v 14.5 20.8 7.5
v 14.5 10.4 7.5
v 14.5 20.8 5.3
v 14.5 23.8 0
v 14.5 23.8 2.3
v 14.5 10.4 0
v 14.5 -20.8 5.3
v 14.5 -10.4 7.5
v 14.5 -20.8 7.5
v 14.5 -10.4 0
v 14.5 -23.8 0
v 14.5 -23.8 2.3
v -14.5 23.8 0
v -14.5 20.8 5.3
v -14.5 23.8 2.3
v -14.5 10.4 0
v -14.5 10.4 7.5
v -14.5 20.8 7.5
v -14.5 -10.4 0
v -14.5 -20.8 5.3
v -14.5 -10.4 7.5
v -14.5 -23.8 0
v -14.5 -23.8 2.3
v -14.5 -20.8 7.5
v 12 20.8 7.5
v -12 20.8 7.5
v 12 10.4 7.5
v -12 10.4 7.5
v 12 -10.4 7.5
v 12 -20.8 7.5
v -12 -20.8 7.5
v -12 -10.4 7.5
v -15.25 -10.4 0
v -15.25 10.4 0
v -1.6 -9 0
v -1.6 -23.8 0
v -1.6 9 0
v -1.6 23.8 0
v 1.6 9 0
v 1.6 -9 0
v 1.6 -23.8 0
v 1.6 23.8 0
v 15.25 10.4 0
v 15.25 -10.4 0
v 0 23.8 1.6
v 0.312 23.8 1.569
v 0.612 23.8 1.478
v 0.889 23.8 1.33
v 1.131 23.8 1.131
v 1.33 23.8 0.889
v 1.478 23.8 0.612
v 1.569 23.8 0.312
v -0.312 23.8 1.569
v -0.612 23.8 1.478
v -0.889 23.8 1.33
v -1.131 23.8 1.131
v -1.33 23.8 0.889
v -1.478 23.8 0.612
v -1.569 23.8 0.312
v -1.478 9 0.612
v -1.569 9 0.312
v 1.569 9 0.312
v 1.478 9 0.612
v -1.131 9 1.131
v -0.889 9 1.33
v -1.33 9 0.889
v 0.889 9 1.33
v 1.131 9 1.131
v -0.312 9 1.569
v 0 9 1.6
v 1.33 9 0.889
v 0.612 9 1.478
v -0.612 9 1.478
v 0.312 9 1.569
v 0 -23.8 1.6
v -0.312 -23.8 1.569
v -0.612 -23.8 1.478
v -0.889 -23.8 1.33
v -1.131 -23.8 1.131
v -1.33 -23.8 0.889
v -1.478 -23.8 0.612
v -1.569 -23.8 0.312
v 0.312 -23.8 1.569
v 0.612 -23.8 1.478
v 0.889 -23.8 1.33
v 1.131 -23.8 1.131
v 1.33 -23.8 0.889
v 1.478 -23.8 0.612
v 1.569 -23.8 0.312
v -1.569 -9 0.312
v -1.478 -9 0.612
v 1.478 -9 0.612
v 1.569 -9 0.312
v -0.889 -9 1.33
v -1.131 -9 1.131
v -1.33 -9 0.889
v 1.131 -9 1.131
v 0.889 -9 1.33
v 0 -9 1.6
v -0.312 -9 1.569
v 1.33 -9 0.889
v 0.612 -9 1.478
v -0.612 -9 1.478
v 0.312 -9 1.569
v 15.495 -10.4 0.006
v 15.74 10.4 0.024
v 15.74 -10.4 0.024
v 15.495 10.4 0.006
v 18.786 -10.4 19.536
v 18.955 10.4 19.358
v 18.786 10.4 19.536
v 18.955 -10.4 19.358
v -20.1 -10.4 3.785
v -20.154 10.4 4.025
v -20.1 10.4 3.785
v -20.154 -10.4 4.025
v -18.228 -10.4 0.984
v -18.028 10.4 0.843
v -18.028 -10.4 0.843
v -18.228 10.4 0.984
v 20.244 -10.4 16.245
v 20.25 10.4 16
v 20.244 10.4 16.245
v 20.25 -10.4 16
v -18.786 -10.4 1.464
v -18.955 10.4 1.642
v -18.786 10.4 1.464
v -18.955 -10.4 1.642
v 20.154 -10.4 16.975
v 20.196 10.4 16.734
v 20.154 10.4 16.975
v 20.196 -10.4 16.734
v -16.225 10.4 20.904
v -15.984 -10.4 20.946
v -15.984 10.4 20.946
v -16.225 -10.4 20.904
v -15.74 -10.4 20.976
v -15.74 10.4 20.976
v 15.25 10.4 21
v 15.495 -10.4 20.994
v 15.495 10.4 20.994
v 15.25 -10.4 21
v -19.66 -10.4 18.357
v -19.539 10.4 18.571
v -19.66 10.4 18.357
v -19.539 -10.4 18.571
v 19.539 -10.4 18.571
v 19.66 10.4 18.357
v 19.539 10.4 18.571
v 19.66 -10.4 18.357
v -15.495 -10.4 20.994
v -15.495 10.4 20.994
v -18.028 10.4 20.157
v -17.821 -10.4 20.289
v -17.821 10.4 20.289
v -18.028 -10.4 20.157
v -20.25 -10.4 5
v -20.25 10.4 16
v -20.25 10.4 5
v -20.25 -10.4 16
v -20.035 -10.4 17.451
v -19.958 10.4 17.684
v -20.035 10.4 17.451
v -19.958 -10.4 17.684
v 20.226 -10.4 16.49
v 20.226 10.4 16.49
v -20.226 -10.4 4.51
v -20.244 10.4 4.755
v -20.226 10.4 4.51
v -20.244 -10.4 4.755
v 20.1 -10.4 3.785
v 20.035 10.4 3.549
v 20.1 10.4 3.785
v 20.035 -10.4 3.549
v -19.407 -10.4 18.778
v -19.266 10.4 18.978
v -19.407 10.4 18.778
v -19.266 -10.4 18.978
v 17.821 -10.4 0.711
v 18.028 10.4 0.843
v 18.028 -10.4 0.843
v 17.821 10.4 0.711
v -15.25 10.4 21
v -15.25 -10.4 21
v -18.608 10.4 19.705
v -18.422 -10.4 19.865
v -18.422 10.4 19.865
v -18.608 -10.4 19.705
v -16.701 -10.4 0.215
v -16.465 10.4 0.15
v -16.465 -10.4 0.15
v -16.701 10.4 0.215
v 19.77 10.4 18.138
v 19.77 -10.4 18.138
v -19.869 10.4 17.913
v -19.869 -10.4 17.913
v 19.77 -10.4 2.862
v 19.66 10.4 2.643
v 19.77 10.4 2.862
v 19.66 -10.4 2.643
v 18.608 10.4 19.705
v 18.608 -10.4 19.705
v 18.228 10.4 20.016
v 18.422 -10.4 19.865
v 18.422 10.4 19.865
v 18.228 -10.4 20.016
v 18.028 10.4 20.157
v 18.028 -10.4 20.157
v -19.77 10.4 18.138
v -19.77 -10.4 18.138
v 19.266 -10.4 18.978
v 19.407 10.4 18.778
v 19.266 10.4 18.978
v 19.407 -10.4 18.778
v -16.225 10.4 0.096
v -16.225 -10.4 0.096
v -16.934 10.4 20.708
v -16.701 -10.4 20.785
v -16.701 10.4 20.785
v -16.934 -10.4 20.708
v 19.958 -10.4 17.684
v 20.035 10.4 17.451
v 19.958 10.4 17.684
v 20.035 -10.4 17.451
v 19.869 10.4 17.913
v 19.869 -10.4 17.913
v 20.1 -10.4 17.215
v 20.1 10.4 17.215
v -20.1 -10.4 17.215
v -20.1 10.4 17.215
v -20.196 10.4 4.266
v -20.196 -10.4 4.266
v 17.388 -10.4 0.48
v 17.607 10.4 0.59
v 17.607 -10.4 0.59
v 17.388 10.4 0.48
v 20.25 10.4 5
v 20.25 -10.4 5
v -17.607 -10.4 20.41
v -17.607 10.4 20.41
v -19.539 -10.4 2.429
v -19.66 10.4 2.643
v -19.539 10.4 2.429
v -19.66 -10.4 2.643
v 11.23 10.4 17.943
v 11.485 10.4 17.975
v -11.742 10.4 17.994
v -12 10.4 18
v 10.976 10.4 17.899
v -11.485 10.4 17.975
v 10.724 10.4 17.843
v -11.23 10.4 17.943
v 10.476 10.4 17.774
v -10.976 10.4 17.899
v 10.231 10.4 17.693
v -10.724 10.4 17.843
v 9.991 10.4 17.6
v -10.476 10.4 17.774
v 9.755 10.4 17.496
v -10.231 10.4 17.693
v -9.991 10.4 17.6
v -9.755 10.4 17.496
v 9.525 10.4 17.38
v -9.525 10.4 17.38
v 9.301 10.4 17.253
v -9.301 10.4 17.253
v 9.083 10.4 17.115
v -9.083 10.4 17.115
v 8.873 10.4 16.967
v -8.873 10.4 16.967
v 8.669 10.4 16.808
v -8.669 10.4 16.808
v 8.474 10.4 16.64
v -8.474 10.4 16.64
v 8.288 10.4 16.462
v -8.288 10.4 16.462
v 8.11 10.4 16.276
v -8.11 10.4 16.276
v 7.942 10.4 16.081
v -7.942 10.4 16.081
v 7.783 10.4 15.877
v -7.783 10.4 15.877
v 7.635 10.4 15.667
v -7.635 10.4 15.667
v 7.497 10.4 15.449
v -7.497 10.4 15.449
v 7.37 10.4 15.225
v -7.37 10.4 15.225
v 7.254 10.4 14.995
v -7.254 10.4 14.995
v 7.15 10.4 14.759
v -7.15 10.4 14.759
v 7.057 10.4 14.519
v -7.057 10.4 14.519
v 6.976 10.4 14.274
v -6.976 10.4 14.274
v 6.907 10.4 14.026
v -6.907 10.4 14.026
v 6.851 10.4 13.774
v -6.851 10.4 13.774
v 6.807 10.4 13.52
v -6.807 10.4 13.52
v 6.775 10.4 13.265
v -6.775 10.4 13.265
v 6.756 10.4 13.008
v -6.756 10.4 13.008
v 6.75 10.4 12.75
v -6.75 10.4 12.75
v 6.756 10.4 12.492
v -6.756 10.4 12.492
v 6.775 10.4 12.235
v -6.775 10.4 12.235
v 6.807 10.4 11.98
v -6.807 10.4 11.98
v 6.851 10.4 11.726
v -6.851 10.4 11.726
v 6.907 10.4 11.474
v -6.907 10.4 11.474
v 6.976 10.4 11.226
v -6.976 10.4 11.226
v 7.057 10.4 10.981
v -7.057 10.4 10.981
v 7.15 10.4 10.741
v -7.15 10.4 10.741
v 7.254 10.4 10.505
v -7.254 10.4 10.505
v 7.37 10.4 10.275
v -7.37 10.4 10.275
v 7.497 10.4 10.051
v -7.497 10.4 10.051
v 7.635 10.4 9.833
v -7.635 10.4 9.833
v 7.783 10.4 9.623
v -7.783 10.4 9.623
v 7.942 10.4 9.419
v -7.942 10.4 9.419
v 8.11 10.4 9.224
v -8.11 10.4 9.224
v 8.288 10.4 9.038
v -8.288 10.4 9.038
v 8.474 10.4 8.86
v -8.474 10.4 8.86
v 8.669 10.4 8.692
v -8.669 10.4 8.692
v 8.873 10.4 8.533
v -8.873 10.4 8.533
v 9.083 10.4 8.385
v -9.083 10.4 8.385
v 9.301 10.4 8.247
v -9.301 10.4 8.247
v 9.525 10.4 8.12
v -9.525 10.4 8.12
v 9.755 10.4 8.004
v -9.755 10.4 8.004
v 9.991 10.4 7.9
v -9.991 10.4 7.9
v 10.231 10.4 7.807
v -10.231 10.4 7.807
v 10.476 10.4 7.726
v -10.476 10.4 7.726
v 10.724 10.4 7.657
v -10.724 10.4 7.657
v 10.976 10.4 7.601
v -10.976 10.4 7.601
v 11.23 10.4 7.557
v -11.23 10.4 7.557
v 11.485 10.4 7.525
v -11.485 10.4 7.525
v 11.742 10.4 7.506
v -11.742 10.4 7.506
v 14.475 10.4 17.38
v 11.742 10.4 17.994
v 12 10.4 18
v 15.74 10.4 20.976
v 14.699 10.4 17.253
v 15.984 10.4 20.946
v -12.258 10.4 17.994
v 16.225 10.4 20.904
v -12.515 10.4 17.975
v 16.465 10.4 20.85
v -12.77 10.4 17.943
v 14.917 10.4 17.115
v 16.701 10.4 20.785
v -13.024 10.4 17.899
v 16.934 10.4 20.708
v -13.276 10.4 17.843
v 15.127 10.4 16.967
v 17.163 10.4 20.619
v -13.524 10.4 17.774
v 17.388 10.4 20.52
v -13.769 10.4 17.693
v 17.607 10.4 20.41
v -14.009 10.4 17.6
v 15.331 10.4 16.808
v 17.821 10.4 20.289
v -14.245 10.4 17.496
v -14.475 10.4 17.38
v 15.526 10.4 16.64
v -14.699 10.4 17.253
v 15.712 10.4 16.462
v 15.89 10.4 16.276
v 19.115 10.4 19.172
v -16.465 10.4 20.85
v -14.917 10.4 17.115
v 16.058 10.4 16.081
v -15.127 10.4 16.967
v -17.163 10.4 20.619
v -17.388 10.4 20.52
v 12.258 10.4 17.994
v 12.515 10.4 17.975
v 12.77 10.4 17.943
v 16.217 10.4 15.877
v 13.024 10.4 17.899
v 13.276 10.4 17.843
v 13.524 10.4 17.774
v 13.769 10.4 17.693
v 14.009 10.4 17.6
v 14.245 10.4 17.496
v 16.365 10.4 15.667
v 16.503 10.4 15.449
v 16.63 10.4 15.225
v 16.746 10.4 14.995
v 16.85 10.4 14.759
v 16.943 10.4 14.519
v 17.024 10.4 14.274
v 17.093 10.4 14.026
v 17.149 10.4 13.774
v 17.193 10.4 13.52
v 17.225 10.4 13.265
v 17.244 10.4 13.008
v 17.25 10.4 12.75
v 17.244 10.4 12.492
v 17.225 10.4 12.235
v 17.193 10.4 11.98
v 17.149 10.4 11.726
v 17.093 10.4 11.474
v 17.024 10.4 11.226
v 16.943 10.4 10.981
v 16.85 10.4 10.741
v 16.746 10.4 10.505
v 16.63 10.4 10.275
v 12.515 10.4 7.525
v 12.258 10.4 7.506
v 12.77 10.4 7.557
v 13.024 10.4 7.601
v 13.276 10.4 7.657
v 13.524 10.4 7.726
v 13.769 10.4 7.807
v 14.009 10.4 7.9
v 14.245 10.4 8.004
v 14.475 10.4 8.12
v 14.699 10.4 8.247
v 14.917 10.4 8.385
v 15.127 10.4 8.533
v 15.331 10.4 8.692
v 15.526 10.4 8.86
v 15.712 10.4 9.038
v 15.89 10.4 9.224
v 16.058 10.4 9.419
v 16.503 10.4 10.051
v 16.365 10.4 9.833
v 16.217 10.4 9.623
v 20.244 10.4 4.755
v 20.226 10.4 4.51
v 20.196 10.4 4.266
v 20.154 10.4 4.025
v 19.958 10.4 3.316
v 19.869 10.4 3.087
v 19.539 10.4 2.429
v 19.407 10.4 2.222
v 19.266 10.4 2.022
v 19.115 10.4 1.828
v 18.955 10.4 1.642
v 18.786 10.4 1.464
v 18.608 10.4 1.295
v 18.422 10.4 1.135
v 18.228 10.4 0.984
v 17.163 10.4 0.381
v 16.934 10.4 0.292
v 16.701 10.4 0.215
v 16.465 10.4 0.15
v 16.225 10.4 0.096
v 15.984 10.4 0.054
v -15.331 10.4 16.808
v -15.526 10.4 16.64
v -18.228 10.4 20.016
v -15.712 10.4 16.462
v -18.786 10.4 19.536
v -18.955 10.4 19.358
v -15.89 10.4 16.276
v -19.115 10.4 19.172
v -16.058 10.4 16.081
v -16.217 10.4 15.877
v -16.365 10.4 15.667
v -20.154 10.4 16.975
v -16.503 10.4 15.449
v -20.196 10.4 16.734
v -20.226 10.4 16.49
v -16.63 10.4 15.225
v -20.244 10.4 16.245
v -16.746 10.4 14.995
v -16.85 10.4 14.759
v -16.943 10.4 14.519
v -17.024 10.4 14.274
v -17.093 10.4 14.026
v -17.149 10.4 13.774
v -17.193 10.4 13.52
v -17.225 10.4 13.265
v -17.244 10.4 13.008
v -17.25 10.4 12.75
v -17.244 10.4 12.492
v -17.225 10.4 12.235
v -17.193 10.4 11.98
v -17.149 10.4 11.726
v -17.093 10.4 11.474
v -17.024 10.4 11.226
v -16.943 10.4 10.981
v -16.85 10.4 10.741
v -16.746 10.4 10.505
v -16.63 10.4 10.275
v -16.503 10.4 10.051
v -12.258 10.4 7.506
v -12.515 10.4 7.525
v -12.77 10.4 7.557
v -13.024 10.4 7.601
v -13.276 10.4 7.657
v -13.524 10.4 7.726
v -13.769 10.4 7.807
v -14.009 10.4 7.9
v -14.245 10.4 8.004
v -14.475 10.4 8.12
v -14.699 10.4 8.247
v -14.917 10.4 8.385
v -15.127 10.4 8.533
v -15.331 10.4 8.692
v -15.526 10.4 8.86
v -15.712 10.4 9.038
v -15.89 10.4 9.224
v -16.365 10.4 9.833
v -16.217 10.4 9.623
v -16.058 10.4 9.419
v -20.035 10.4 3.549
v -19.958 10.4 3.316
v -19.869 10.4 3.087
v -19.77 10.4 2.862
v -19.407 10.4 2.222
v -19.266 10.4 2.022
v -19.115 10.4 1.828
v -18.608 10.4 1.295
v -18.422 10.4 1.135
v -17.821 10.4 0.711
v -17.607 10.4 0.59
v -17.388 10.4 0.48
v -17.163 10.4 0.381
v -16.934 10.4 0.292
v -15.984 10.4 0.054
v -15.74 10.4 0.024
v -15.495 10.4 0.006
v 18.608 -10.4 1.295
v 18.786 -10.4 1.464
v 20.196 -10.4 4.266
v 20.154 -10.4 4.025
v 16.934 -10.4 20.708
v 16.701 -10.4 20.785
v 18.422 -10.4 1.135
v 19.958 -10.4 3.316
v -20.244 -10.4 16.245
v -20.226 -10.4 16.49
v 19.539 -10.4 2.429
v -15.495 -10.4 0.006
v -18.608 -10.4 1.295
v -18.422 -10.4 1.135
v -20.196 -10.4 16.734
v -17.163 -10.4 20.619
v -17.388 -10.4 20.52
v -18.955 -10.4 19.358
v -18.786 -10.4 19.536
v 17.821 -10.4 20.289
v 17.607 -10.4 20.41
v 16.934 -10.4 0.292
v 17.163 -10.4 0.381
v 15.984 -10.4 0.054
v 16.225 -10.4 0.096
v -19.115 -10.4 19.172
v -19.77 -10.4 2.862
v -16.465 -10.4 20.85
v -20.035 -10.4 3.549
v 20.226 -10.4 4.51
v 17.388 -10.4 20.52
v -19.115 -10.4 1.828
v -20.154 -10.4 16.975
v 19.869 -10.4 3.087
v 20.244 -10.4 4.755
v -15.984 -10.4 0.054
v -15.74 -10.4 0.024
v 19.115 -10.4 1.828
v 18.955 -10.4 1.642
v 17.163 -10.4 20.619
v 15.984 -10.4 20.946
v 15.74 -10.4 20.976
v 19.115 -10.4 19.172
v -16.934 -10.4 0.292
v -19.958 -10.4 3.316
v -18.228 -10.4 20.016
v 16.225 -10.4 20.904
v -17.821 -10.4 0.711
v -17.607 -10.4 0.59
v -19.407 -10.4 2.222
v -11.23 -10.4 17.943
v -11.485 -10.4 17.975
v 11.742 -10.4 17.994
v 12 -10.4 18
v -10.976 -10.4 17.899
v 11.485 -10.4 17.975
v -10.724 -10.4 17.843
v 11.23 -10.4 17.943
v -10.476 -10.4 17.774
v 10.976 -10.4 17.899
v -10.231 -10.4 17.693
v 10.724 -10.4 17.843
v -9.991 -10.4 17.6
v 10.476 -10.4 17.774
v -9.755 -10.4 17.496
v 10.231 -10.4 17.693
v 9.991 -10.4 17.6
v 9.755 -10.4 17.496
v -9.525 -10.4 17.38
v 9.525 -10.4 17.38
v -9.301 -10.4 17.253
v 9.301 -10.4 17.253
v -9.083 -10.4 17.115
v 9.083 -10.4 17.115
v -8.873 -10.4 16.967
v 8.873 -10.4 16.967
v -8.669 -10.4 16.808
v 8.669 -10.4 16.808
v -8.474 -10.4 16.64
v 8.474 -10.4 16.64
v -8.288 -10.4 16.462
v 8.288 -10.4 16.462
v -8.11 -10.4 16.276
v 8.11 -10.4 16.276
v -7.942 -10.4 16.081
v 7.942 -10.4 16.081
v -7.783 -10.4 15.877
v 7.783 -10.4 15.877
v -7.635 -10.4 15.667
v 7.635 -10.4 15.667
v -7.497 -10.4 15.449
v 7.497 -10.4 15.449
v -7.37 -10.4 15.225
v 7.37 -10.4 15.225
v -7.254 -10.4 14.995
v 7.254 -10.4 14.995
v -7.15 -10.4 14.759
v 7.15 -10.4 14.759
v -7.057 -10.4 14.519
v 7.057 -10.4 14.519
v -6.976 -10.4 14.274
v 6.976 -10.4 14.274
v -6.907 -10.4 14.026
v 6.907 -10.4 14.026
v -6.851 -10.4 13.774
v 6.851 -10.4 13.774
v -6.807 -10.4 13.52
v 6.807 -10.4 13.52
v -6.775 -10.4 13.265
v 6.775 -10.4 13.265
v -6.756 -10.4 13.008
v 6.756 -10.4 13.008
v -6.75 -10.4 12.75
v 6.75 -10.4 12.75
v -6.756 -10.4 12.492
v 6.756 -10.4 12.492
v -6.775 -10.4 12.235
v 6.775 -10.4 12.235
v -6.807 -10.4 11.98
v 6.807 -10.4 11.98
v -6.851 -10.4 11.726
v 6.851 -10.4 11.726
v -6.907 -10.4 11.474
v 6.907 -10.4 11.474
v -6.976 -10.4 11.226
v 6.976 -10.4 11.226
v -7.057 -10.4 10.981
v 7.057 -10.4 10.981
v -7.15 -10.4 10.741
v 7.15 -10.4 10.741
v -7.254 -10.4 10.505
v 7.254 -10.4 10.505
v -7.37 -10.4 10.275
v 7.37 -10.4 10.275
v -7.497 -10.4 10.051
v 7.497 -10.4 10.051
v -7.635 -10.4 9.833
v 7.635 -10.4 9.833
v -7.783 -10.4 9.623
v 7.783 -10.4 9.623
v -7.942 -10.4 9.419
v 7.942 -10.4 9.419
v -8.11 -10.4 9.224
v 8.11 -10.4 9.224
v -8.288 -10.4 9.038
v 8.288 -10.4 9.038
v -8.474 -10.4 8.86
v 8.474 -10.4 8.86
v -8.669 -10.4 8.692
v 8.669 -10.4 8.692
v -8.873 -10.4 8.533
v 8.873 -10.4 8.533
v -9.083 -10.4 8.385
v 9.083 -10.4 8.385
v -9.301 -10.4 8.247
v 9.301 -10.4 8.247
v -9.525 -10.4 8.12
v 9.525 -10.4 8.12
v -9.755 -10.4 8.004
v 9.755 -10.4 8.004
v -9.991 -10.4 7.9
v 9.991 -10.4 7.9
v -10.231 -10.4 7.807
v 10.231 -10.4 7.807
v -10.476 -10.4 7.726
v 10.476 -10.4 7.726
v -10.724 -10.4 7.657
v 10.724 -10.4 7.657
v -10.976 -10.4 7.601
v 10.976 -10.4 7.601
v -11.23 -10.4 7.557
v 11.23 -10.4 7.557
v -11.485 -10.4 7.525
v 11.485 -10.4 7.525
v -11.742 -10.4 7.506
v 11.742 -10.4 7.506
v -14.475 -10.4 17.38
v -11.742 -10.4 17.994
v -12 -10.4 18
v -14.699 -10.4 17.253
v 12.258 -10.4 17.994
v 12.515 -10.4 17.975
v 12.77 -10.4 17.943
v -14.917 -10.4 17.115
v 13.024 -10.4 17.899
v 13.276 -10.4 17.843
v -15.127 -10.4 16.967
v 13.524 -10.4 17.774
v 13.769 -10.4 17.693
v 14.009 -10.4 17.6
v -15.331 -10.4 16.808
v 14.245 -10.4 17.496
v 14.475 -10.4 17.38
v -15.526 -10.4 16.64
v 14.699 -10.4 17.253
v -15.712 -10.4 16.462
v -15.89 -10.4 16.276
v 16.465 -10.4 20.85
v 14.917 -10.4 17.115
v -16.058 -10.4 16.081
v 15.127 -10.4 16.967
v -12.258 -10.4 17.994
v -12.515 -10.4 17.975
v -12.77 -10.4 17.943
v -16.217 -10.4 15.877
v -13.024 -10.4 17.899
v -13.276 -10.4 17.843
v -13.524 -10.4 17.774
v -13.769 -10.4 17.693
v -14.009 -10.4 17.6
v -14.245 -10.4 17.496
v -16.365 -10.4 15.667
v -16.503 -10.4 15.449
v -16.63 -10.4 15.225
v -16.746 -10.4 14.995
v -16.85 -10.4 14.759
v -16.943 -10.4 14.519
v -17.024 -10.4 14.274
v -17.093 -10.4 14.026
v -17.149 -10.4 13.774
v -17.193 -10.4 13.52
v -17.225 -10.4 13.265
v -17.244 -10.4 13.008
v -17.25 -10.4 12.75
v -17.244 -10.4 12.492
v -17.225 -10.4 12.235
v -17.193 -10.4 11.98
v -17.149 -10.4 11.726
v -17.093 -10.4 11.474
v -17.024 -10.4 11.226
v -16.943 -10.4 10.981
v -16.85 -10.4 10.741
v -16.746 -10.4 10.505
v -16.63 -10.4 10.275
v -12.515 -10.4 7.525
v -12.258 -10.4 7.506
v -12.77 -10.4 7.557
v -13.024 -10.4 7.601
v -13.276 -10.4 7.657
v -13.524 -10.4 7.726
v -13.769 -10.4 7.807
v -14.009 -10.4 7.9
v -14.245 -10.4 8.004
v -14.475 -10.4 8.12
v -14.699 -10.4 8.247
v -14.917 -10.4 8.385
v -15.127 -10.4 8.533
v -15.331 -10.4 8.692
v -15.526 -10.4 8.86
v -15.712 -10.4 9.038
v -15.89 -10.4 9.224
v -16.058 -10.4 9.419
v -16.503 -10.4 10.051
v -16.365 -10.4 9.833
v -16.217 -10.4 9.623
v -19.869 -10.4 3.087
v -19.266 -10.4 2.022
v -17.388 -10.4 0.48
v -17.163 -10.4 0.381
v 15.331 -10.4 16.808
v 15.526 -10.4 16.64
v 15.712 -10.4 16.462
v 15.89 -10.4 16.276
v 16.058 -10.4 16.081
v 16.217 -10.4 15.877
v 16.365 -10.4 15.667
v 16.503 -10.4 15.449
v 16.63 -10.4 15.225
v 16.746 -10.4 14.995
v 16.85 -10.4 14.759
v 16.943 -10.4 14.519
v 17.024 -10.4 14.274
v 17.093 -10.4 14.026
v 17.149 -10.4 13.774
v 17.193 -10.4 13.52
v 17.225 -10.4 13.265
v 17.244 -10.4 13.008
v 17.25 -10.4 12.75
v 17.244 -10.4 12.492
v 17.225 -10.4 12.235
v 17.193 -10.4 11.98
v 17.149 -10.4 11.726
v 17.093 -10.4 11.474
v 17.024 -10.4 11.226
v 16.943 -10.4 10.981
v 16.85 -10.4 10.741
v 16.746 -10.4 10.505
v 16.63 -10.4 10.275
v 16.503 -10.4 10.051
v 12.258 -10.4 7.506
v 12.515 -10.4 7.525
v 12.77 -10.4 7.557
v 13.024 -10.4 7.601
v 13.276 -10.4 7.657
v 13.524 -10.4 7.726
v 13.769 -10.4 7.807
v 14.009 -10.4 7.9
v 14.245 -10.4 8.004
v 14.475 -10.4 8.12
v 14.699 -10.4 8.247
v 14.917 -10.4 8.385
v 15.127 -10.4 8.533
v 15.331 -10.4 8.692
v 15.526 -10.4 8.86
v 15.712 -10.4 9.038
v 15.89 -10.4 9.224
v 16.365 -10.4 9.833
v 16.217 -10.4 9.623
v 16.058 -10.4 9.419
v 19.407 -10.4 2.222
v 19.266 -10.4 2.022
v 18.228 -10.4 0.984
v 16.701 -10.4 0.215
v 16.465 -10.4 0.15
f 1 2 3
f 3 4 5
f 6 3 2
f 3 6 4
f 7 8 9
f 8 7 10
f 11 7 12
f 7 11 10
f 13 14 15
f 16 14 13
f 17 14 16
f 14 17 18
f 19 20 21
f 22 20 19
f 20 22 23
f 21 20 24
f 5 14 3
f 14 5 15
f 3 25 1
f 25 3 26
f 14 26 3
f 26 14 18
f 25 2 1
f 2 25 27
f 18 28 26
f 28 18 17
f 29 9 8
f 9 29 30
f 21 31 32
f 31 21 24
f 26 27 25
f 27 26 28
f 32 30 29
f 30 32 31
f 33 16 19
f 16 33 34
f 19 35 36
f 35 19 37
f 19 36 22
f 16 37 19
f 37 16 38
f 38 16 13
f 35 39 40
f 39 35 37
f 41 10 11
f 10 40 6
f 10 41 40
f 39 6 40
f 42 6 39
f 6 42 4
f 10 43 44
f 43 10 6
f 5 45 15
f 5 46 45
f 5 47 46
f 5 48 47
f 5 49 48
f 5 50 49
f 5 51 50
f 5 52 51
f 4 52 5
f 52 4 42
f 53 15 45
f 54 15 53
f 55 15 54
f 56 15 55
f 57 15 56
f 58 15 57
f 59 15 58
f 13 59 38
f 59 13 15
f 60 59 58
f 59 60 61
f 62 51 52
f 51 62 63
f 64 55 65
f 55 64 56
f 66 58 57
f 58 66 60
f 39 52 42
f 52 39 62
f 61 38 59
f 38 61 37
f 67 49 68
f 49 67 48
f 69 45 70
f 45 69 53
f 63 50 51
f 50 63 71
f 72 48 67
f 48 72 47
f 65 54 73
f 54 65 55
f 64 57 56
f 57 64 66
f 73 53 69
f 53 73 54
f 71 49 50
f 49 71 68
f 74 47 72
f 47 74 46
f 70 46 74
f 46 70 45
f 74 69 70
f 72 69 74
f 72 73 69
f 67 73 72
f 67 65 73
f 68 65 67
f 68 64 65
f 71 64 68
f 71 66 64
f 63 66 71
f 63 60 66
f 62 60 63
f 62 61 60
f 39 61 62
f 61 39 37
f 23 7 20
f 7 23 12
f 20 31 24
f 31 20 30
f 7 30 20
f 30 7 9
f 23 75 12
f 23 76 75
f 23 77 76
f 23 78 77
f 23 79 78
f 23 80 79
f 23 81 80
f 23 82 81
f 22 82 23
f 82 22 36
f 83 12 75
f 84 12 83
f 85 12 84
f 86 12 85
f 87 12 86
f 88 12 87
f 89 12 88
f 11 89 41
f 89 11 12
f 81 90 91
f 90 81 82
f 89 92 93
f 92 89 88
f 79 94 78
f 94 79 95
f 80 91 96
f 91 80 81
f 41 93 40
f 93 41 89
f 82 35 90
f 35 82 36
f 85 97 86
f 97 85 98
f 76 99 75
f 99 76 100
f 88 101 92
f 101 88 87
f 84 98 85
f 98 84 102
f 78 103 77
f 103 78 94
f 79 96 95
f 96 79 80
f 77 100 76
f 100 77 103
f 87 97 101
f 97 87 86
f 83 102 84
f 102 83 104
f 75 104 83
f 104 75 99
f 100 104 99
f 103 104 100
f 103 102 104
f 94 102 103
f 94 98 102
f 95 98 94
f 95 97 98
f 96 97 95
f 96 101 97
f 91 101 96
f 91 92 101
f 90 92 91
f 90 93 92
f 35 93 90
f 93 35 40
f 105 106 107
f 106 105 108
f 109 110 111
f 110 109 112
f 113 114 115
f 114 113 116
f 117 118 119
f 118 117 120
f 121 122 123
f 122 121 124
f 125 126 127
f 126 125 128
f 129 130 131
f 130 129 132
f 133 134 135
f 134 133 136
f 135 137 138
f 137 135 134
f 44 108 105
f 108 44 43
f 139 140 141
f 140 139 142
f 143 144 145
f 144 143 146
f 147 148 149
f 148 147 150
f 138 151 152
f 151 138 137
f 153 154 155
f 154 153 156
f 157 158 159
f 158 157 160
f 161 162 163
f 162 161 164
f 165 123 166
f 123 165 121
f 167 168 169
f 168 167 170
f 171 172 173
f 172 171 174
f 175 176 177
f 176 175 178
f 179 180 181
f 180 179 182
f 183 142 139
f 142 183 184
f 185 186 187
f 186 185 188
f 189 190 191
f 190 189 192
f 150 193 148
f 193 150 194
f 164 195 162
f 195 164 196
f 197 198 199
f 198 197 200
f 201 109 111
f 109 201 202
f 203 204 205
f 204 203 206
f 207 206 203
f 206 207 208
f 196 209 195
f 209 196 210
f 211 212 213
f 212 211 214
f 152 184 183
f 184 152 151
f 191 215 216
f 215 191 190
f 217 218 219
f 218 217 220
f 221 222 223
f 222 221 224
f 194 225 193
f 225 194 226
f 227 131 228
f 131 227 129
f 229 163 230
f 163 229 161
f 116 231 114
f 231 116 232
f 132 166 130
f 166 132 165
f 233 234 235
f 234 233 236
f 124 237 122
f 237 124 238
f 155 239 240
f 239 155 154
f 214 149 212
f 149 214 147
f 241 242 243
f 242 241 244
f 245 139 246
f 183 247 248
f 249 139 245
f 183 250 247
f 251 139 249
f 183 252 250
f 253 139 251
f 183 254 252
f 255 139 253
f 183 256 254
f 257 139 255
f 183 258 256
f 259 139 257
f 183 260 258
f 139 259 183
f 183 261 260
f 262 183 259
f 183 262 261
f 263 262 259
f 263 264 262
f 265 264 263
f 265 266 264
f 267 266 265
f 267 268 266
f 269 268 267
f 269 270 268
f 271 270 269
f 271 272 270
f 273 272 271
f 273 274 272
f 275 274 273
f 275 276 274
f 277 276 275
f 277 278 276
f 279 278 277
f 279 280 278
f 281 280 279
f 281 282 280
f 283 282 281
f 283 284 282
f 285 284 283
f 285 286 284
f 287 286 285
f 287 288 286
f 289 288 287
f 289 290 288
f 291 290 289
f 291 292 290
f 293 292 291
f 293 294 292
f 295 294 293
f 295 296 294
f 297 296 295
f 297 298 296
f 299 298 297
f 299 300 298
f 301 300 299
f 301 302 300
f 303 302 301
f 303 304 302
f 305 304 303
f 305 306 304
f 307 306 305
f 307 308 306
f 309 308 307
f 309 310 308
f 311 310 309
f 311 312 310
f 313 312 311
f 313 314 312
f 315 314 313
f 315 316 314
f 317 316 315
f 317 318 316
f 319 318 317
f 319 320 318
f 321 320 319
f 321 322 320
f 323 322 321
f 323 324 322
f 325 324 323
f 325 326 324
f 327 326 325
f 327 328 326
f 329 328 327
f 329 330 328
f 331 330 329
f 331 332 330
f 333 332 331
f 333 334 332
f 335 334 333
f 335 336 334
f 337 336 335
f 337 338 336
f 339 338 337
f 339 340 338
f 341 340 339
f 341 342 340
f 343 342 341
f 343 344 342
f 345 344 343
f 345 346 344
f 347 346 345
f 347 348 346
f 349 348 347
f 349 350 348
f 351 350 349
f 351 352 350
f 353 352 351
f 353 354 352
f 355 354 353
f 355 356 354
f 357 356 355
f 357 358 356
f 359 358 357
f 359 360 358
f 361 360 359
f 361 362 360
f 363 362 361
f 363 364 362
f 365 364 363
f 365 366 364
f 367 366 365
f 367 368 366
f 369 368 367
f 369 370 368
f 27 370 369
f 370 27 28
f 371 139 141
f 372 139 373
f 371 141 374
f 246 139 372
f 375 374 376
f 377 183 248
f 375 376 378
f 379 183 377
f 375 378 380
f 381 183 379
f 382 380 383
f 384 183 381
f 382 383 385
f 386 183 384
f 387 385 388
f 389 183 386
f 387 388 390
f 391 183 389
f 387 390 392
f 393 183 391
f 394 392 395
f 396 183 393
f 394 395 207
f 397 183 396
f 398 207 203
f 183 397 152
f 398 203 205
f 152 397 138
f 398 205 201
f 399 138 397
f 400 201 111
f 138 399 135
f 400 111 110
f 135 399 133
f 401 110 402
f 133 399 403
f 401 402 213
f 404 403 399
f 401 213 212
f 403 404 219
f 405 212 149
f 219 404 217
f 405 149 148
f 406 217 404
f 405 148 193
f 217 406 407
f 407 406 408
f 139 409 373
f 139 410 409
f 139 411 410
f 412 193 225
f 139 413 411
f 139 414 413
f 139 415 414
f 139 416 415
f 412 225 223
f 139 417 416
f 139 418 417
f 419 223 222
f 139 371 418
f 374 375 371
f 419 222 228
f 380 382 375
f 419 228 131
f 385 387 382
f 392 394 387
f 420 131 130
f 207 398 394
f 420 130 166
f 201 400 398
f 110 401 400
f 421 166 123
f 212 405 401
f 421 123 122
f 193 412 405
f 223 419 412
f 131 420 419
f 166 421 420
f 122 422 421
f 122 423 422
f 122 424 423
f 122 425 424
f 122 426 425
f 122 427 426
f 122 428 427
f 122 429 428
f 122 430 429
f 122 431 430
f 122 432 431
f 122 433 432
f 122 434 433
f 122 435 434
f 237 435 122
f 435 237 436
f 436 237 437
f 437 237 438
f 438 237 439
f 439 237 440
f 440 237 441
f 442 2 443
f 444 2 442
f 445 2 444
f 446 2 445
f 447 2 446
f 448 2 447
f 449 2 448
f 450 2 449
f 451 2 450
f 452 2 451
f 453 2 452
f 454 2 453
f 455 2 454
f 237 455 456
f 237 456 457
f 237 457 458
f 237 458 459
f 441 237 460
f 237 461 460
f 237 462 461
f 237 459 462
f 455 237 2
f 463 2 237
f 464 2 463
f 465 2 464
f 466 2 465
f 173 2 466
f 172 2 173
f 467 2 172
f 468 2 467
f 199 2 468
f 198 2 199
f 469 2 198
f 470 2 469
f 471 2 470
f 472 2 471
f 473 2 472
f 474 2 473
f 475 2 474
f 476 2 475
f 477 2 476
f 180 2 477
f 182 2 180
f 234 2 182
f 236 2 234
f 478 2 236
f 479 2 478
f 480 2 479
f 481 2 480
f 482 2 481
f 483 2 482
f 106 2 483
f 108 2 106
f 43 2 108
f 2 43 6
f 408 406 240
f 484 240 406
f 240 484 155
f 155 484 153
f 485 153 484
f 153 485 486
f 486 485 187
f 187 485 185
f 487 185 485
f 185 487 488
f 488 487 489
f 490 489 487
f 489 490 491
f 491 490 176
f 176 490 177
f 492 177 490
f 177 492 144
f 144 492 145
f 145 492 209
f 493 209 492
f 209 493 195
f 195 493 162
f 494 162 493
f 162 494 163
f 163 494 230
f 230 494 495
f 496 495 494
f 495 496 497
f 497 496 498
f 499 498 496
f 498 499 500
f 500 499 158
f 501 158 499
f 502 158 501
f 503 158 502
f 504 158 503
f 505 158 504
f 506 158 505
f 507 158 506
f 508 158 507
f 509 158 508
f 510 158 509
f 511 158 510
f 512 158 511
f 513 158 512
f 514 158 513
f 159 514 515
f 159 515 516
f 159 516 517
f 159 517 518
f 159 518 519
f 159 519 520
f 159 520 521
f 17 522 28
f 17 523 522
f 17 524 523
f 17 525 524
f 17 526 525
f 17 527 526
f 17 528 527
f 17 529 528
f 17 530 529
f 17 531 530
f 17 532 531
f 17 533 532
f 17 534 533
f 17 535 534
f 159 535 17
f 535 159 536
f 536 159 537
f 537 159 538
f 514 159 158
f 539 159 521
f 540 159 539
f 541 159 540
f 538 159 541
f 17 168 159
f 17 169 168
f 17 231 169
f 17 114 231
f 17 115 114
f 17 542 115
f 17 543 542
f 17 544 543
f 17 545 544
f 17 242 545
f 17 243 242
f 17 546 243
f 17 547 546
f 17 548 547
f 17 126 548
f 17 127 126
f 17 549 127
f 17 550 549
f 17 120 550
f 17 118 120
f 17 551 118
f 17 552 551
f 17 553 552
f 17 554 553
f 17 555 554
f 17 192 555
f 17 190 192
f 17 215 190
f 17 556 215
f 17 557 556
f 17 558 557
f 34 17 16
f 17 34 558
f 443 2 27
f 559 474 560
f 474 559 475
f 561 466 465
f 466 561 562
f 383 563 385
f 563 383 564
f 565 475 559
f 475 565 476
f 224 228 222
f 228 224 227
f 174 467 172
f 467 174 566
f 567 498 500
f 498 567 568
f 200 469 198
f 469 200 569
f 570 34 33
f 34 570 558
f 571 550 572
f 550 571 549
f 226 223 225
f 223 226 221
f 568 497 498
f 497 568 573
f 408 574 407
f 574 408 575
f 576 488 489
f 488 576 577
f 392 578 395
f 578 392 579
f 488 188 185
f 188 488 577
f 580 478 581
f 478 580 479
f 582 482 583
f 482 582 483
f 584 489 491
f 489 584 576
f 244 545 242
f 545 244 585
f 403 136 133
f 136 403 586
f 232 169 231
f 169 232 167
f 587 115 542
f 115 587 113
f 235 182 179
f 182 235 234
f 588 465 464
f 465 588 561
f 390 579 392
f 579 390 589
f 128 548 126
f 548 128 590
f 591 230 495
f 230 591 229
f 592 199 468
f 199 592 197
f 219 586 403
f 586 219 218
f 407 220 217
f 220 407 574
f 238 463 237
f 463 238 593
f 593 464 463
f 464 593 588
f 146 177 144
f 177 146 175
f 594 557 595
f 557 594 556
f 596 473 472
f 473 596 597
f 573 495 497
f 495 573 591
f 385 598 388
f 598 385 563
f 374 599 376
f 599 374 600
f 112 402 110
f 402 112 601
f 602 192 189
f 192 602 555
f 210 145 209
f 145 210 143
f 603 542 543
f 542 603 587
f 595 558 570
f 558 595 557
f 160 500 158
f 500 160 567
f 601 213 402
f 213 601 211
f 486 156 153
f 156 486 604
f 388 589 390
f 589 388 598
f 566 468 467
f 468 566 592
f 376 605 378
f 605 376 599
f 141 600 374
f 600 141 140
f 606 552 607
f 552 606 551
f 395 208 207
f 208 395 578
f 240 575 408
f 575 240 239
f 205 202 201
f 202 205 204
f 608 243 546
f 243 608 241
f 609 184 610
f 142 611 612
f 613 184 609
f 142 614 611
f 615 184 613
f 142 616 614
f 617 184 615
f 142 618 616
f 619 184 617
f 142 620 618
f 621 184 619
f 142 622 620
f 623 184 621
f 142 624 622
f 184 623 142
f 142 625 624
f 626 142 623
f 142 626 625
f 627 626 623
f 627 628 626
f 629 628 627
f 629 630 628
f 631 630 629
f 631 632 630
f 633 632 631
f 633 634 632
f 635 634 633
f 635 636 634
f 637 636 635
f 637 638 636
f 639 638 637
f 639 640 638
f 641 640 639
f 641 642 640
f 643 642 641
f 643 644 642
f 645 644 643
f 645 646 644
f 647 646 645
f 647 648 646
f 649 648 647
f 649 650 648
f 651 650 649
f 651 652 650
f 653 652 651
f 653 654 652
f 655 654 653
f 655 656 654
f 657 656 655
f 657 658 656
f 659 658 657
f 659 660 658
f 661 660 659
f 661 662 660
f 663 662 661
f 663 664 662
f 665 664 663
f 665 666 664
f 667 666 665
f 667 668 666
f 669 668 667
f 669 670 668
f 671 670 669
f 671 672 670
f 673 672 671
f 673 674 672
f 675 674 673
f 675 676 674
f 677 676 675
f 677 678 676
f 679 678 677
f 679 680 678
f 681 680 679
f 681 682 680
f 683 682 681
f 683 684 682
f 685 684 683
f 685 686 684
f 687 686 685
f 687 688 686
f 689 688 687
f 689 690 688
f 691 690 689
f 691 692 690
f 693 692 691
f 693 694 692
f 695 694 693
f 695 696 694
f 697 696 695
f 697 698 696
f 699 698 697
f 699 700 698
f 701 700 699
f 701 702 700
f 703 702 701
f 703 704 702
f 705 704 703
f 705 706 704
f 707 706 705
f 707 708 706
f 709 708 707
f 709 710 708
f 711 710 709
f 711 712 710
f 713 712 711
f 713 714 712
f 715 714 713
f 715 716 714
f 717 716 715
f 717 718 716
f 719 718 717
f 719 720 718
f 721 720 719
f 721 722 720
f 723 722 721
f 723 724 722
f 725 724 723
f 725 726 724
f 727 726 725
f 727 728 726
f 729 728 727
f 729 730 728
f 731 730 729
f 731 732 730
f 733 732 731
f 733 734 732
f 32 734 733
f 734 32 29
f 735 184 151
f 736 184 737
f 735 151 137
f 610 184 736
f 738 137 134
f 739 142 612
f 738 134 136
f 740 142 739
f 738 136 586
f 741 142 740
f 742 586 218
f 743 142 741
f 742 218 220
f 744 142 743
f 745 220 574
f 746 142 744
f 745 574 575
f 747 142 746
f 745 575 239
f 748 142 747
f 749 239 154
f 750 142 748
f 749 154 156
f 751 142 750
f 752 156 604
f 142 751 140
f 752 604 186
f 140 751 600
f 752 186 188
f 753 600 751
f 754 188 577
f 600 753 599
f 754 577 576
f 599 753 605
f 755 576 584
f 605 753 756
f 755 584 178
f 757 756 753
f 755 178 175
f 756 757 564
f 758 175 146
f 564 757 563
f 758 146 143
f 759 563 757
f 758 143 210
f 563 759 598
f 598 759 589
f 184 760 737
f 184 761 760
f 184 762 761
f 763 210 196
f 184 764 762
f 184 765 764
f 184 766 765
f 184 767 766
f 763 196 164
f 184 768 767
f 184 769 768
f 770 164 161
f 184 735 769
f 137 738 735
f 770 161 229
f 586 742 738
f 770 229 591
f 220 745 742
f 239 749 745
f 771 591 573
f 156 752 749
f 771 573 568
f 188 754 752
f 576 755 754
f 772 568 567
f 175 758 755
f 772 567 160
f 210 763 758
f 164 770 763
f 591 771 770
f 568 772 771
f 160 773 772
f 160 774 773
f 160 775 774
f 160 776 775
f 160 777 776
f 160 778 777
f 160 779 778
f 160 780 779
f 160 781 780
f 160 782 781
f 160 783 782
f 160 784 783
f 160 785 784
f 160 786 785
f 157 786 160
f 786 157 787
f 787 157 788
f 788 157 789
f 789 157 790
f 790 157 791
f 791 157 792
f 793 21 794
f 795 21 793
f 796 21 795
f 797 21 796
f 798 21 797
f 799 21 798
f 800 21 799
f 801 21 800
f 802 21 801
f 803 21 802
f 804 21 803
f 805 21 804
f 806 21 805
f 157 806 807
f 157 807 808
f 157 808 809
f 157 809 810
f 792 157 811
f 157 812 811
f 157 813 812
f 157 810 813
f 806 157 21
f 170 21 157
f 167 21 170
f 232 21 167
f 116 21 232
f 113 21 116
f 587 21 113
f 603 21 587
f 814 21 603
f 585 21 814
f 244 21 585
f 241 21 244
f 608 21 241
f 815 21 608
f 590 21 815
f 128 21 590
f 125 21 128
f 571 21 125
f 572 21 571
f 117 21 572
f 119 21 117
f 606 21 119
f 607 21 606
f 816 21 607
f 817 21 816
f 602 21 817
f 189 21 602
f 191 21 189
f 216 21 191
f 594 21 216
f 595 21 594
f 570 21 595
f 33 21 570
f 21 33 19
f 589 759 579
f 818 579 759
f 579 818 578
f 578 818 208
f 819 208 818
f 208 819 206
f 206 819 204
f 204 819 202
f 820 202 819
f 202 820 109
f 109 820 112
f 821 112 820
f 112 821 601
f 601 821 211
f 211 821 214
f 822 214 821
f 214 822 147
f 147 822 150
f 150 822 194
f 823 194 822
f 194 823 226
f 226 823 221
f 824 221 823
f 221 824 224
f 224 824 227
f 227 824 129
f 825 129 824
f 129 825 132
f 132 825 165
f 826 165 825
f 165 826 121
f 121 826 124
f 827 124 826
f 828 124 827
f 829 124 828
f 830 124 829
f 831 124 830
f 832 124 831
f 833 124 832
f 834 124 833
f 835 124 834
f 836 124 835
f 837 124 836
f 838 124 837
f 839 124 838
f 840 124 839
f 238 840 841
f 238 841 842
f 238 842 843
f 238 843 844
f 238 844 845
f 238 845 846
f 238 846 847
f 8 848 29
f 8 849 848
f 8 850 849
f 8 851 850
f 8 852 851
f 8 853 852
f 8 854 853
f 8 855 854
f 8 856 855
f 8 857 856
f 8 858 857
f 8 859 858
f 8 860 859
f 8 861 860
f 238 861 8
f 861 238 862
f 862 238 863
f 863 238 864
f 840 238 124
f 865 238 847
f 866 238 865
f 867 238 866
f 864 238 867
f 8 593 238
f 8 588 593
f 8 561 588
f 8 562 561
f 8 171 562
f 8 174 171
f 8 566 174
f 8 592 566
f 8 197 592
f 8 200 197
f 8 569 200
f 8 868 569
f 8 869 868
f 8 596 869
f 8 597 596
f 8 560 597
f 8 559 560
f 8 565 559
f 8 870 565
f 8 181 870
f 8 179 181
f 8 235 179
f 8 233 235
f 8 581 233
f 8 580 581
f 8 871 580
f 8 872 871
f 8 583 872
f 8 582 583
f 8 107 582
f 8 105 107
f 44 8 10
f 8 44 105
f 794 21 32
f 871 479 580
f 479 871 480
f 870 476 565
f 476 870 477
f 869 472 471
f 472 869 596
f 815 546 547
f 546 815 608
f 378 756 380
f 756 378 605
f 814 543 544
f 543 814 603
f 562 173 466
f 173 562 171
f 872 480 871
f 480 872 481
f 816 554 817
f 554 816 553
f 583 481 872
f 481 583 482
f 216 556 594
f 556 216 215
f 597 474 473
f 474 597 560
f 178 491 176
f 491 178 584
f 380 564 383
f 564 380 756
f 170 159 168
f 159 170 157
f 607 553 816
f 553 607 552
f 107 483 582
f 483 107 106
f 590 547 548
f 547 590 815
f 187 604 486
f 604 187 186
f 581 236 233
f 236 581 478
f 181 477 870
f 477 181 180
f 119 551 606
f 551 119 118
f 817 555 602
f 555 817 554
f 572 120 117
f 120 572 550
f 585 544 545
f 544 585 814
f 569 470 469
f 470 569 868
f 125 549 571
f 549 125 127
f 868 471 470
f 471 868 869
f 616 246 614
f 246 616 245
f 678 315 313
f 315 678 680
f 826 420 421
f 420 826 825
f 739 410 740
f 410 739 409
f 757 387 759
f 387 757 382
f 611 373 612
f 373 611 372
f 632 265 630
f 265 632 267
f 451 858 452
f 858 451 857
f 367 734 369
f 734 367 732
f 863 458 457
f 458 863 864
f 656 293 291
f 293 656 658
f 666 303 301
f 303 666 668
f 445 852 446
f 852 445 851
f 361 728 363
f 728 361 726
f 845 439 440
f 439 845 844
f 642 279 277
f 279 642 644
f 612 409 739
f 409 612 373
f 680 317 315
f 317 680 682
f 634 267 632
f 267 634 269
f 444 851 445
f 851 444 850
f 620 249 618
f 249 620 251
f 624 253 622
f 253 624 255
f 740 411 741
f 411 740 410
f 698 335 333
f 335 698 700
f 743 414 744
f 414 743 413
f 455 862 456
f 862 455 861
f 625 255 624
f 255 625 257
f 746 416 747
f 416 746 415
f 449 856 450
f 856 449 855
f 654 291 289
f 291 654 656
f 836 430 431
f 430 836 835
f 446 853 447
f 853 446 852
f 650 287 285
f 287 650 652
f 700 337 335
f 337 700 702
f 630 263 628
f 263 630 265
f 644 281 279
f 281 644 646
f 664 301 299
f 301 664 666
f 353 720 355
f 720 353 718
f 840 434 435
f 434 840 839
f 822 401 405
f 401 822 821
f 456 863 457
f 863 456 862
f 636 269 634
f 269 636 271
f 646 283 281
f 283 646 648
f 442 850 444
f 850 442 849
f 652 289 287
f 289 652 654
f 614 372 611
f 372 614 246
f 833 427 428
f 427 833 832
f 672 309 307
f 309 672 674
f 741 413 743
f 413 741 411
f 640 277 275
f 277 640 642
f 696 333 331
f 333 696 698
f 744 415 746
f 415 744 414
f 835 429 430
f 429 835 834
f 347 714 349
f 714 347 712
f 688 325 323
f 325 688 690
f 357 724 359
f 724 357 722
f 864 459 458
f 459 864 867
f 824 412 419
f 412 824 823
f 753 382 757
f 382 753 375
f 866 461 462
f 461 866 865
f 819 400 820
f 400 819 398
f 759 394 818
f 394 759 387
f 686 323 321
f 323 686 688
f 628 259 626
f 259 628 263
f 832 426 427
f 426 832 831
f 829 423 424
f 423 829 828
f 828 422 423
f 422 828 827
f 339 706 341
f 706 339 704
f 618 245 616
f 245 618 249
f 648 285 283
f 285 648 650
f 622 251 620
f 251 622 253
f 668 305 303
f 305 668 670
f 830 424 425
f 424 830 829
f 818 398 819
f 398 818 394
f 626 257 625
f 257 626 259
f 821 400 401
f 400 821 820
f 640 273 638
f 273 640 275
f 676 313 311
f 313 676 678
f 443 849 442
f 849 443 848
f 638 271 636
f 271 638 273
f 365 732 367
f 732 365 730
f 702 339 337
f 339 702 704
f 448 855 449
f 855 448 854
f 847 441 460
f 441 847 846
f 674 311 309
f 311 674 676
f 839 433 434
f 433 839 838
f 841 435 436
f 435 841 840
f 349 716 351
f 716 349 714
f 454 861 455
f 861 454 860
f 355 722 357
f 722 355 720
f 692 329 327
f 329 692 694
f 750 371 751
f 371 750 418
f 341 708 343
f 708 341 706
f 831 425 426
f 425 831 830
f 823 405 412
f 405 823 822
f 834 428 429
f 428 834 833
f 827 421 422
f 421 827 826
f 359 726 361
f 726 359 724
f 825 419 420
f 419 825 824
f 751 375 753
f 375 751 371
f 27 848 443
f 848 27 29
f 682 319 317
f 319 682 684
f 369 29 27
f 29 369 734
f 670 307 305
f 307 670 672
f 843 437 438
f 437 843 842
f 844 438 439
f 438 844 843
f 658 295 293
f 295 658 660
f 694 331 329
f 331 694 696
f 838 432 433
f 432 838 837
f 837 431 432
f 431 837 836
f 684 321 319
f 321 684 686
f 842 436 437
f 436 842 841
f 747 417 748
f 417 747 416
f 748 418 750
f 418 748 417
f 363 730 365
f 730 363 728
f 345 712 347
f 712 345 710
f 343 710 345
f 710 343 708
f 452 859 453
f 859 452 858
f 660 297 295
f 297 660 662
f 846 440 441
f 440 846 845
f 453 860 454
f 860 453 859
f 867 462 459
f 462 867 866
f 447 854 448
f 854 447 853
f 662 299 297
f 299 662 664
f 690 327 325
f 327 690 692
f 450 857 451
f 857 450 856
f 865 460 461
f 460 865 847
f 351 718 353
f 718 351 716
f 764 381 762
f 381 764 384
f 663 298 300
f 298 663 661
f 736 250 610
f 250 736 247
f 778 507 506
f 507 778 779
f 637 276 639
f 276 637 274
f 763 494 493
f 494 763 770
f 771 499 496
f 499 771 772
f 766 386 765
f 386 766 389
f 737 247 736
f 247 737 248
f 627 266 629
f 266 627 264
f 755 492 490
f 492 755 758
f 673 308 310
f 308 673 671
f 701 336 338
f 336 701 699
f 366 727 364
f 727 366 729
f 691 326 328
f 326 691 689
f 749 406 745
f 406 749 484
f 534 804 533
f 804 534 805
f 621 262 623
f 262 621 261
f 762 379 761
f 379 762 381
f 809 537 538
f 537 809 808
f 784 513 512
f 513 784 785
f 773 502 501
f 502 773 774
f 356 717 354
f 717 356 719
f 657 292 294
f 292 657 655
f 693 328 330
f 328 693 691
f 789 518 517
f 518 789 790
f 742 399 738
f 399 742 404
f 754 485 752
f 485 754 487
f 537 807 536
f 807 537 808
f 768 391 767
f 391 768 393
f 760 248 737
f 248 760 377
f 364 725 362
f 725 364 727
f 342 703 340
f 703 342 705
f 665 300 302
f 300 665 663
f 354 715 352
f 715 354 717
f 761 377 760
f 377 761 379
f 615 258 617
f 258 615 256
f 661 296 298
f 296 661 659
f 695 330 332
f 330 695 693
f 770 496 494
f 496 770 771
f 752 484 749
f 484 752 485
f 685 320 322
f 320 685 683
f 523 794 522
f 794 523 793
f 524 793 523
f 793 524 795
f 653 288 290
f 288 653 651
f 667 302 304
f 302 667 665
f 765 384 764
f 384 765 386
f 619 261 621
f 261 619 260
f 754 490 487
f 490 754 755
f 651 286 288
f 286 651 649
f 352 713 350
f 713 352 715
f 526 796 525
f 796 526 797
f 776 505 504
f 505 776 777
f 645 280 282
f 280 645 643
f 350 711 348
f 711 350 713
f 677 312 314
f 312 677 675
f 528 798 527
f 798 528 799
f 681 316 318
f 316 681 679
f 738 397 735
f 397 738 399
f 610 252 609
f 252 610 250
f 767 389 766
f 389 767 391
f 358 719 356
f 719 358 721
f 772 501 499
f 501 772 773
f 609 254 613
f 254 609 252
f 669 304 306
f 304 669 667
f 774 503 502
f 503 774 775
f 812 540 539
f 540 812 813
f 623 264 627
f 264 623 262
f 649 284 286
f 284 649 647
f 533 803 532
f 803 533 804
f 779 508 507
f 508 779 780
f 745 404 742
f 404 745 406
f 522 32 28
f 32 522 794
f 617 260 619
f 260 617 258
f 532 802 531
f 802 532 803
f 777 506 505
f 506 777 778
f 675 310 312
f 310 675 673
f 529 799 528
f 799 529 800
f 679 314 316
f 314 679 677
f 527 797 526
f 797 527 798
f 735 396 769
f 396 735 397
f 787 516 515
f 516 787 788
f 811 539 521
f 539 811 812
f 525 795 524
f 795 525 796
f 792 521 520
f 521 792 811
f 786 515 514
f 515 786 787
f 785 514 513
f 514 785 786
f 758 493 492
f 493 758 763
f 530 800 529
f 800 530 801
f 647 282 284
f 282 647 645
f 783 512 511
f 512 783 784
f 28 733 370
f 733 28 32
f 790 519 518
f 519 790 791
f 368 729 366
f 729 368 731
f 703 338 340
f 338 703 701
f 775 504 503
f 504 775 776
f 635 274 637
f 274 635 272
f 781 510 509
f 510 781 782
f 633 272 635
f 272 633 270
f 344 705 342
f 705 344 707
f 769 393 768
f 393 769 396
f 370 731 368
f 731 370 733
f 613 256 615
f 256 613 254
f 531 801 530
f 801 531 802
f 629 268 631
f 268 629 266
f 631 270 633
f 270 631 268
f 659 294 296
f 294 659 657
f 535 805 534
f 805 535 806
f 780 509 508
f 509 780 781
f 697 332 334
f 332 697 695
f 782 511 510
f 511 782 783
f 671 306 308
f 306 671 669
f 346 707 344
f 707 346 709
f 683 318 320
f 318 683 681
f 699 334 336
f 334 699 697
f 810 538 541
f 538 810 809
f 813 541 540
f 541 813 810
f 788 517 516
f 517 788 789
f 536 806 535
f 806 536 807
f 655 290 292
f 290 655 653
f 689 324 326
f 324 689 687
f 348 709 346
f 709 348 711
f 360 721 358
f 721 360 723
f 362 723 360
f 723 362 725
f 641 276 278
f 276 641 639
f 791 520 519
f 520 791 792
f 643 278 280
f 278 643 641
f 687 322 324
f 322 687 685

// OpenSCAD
// file: BikeRackMountCenter.scad
include <../../variables.scad>

use <../../lib/Round-Anything/polyround.scad>
use <../../lib/utils.scad>

module BikeRackMountSide() {
  r1 = 1;
  w = 8;
  W = 20;
  r2 = BikeRackMount_rail_diameter/2 + w;
  r3 = 4;

  difference() {
    rotate([90, 0, -90])
    linear_extrude(BikeRackMountSide_length, center=true, convexity=2)
    polygon(polyRound([
      [0, 0, r1],
      [W, 0, r1],

      [W, -r2/2, r2],
      // [W - r2, -r2, 0],
      // [w + r3, -r2, 0],
      [w, -r2, r2],
      [w, -BikeRackMountSide_height, r1],
      [0, -BikeRackMountSide_height, r1],
    ], fn=$pfn));

    // rail
    translate([-10, -W/2, 0])
    rotate([90, 0, -90])
    cylinder(d=BikeRackMount_rail_diameter, h=BikeRackMountSide_length+20, center=true);

    // zip ties
    for(i=[-1,1])
    translate([i*BikeRackMount_rod_distance/2, 0, -2])
    intersection() {
      translate([-50, -50, -100])
      cube(100);

      difference() {
        translate([0, -W/2, 0])
        rotate([90, 0, -90])
        cylinder(r=W/2+3, h=BikeRackMountSide_channel_width, center=true);

        translate([0, -W/2, 0])
        rotate([90, 0, -90])
        cylinder(r=W/2, h=BikeRackMountSide_channel_width, center=true);
      }
    }

    rotate([0, 0, 90])
    RodHoles();
  }
}

module RodHoles() {
  // holes for cross rods
  for(i=[-1,1])
  translate([0, i*BikeRackMount_rod_distance/2, -BikeRackMountSide_height + BikeRackMount_rod_diameter/2+BikeRackMount_bottom_spacing])
  rotate([0, 90, 0])
  cylinder(d=BikeRackMount_rod_diameter, h=100, center=true);
}


vertical_offset = 10;

module BikeRackMountCenter(longitudinal=false) {

  difference() {
    union () {
      translate([MountRail_width/2, 0, -vertical_offset-MountRail_total_height])
      rotate([0, 0, 90])
      mirror([0, 0, 1])
      MountRail(MountRail_clearance);

      w = MountRail_plate_width - 2 * MountRail_clearance;
      r = 5;

      if (longitudinal) {
        difference() {
          hull()
          for(x=[-1,1])
          for(z=[-vertical_offset-r, -BikeRackMountSide_height+r])
          translate([x*((BikeRackMount_rod_distance+BikeRackMount_rod_diameter+BikeRackMount_bottom_spacing*2)/2-r), 0, z])
          rotate([-90, 0, 0])
          cylinder(r=r, h=w/2, center=true);

          // cut away the center so it does not overlap and fill the pin channels in the mount
          translate([0, 0, -vertical_offset])
          cube([5, 200, 5], center=true);
        }
      } else {
        hull () {
          translate([-MountRail_width/2, -w/2, -BikeRackMountSide_height+r])
          cube([MountRail_width, w, BikeRackMountSide_height-vertical_offset-MountRail_total_height-r]);

          for(i=[-1,1])
          translate([-MountRail_width/2, i*(w/2-r), -BikeRackMountSide_height+r])
          rotate([0, 90, 0])
          cylinder(r=r, h=MountRail_width);
        }
      }
    }

    if (longitudinal) {
      rotate([0, 0, 90])
      RodHoles();
    } else {
      RodHoles();
    }
  }
}

module BikeRackMountDebug() {
  translate([-60, 0, 0])
  rotate([0, 0, -90])
  BikeRackMountSide();

  rotate([0, 0, 180])
  translate([-60, 0, 0])
  rotate([0, 0, -90])
  BikeRackMountSide();

  BikeRackMountCenter();

  %for(i=[-1,1])
  translate([0, i*BikeRackMount_rod_distance/2, -BikeRackMountSide_height + BikeRackMount_rod_diameter/2+BikeRackMount_bottom_spacing])
  rotate([0, 90, 0])
  cylinder(d=BikeRackMount_rod_diameter, h=200, center=true);
}

// !BikeRackMountCenter();

translate([0, 0, MountRail_width/2])
rotate([0, -90, 0])
translate([0, 0, BikeRackMountSide_height])
BikeRackMountCenter();
// file: ../../lib/utils.scad
include <../variables.scad>

use <./Round-Anything/polyround.scad>


module mirrorCopy(v, mirrorOffset=0) {
  children();

  translate([v[0]*mirrorOffset, v[1]*mirrorOffset, v[2]*mirrorOffset])
  mirror(v)
  translate([-v[0]*mirrorOffset, -v[1]*mirrorOffset, -v[2]*mirrorOffset])
  children();
}

module mirrorRotate(r) {
  children();

  rotate(r)
  children();
}


module draft(vertical, offs) {
  hull() {
    translate([0, 0, vertical])linear_extrude(0.01)children();
    linear_extrude(0.01)offset(offs)children();
  }
}

module roundedCube(dimen, radii, center=false) {
  translate(center ? [-dimen.x/2, -dimen.y/2, -dimen.z/2] : [0, 0, 0])
  linear_extrude(dimen.z)
  polygon(polyRound([
    [0, 0, is_num(radii) ? radii : radii[0]],
    [dimen.x, 0, is_num(radii) ? radii : radii[1]],
    [dimen.x, dimen.y, is_num(radii) ? radii : radii[2]],
    [0, dimen.y, is_num(radii) ? radii : radii[3]],
  ], fn=$pfn));
}

module HeatsetInsertHole(bottom=false) {
  translate([0, 0, bottom ? 0 : -HeatsetInsert_height]) {

    rotate_extrude()
    polygon([
      [0, 0],
      [0, HeatsetInsert_height],
      [HeatsetInsert_diameter/2, HeatsetInsert_height],
      [HeatsetInsert_diameter/2, HeatsetInsert_height-HeatsetInsert_full_depth],
      [HeatsetInsert_diameter/2+HeatsetInsert_extra_radius, HeatsetInsert_height-HeatsetInsert_full_depth-HeatsetInsert_extra_radius],
      [HeatsetInsert_diameter/2+HeatsetInsert_extra_radius, 0],
    ]);
  }
}

function roundedRectangle(width, height, radius) =
  polyRound([
    [width/2, height/2, radius],
    [-width/2, height/2, radius],
    [-width/2, -height/2, radius],
    [width/2, -height/2, radius],
  ], fn=$pfn);


module ChamferPyramid(l)       polyhedron(
  //        P0        P1        P2         P3       P4
  points= [[l,l,0], [l,-l,0], [-l,-l,0], [-l,l,0], [0,0,l]],
  faces=  [[0,1,4], [1,2,4],  [2,3,4],    [3,0,4], [1,0,3],  [2,1,3] ]
 );

/**
 * Produces a rail with a smaller plate to attach to, and a bigger base that
 * holds it in the opposite rail. The rail is centered on one of the long edges
 * of the plate that can be built upon, ranging wide in both x directions and
 * short into the positive y direction.
 */
module MountRail(clearance=MountRail_clearance) {
  translate([0, 0, -MountRail_total_height ])
  rotate([90, 0, 180])
  mirrorCopy([1, 0, 0])
  difference() {
    linear_extrude(MountRail_width,convexity=2)
    polygon([
      [0, 0],
      [MountRail_base_width/2-clearance, 0],
      [MountRail_base_width/2-clearance, MountRail_base_height-clearance],
      [MountRail_plate_width/2-clearance, MountRail_base_height+MountRail_chamfer_height-clearance],
      [MountRail_plate_width/2-clearance, MountRail_total_height],
      [0, MountRail_base_height+MountRail_chamfer_height+MountRail_plate_distance]
    ]);

    translate([MountRail_base_width/2, 0, MountRail_width/2])
    rotate([0, -90, 0])
      cylinder(r=MountRail_pin_radius, h=MountRail_pin_length, $fn=32);
  }
}

module ScrewHole(
  depth, // total depth, including head
  diameter=ScrewHole_diameter_M3,
  head_depth=0,
  head_diameter=0,
  elongation=0,
) {
  union () {
    // Screw head hole or slot
    if (head_depth > 0) {
      head_diameter_actual = head_diameter ? head_diameter  : diameter * 2;

      hull() {
        for(i=elongation ? [-1,1] : 0)
        translate([i*elongation/2, 0, -head_depth])
        cylinder(d=head_diameter_actual, h=head_depth);
      }
    }

    // Screw hole or slot
    hull() {
      for(i=elongation ? [-1,1] : 0)
      translate([i*elongation/2, 0, -depth])
      cylinder(d=diameter, h=depth);
    }
  }
}

module ScrewHoleM3(depth, head_depth=0, elongation=0) {
  ScrewHole(
    depth,
    diameter=ScrewHole_diameter_M3,
    head_depth=head_depth,
    head_diameter=ScrewHole_diameter_M3*2,
    elongation=elongation
  );
}
// main file
include <../../variables.scad>

use <../../lib/utils.scad>
use <./BikeRackMountCenter.scad>

// Vhis variation includes holes for rods that run longitudinally, i.e. from
// front to back, in the center piece of the mount. This also changes the base
// shape and print orientation.

translate([0, 0, -10])
rotate([180, 0, 0])
BikeRackMountCenter(longitudinal=true);
